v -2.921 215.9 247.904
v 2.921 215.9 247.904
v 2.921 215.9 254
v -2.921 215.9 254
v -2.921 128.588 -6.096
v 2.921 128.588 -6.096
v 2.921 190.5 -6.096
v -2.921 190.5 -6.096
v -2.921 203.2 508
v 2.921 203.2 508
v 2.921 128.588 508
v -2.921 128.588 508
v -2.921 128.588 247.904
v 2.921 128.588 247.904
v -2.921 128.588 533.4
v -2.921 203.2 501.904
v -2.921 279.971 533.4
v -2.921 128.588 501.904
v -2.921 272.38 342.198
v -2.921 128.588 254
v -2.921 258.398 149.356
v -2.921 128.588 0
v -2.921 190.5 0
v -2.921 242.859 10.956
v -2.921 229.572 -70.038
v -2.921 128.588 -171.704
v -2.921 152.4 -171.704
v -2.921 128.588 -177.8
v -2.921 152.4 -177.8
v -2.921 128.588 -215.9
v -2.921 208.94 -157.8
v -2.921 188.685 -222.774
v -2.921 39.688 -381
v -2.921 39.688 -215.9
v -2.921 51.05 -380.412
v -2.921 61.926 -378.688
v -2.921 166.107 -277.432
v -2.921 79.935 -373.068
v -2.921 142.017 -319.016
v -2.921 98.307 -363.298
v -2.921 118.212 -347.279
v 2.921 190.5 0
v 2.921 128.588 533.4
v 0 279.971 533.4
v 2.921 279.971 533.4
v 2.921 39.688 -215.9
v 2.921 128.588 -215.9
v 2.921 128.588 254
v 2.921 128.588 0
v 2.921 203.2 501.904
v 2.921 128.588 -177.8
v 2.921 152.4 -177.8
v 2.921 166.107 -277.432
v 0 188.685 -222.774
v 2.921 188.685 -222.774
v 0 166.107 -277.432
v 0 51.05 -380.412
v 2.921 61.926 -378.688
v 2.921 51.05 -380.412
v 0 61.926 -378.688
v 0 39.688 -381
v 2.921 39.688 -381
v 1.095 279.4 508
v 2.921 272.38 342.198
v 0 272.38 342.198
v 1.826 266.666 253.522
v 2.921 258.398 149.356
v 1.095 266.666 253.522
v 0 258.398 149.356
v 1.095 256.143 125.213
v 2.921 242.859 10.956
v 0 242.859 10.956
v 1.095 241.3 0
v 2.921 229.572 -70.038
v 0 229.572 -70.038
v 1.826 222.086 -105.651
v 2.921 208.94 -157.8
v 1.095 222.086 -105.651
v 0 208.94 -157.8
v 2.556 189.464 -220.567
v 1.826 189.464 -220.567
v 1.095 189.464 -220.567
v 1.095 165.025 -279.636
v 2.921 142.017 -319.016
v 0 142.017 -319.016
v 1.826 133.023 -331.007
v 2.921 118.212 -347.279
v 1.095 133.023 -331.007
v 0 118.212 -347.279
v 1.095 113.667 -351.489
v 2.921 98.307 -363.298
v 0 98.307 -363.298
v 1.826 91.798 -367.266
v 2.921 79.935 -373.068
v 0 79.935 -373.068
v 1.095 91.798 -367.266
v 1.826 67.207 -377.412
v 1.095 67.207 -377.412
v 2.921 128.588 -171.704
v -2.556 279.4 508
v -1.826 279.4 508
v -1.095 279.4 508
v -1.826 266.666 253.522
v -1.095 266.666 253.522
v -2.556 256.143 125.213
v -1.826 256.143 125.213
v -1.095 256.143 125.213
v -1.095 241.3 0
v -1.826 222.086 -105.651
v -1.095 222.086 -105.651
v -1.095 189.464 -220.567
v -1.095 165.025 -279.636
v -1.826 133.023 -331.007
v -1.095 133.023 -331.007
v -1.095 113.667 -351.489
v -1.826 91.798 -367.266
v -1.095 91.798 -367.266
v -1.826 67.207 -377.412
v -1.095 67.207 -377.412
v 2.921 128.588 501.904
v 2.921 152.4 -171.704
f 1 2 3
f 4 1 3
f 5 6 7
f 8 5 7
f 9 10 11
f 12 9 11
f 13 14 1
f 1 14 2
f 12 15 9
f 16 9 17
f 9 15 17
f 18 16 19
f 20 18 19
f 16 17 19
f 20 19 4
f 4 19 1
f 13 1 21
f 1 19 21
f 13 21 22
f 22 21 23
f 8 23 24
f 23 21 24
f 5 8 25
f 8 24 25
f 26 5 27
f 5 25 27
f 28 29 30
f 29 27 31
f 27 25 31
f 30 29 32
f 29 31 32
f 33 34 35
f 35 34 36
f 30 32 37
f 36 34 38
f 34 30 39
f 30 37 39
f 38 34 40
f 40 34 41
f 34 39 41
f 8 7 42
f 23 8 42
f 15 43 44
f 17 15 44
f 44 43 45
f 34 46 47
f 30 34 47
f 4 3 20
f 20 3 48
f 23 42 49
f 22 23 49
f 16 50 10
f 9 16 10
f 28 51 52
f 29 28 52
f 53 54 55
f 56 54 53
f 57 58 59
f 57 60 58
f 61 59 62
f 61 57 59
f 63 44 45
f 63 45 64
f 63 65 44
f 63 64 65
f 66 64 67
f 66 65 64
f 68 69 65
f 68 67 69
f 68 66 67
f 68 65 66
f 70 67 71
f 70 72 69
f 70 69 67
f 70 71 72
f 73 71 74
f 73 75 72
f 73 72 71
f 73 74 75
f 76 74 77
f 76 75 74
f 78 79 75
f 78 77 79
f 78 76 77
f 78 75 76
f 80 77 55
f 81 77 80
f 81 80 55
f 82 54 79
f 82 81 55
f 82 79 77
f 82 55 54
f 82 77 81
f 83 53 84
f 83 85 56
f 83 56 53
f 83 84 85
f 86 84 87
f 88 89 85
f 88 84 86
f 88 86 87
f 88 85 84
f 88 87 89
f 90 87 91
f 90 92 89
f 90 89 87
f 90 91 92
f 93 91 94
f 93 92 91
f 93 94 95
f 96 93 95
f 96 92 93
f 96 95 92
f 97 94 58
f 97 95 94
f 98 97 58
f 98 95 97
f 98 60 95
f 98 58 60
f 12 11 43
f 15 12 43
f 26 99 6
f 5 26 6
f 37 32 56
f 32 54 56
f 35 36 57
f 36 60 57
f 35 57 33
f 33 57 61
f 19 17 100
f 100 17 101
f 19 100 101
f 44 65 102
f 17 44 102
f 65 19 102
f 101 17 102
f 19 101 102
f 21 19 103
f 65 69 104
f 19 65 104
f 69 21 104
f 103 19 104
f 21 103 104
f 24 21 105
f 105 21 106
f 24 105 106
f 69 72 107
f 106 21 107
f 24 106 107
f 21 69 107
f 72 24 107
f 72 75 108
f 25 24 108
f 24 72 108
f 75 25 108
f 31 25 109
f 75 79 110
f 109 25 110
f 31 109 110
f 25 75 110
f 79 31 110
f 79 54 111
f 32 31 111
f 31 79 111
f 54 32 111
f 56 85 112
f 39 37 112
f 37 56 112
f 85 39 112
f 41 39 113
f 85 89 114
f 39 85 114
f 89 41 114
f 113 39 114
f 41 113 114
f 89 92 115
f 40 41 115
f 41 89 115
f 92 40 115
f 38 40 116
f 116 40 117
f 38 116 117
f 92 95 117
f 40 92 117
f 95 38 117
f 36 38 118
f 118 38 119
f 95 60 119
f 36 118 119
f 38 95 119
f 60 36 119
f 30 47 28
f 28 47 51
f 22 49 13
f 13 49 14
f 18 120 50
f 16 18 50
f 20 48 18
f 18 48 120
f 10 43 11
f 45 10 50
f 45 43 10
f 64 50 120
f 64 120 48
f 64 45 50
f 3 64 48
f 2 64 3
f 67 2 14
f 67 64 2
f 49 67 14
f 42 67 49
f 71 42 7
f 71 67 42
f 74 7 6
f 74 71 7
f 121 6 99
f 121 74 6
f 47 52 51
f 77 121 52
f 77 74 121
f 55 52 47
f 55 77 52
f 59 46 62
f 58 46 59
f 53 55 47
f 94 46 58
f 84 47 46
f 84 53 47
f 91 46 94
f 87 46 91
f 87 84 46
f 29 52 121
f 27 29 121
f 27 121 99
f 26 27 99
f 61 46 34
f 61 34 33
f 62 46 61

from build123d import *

# Parameters (mm, degrees)
BOSS_EXTRUDE1_DEPTH = 2.921
CUT_EXTRUDE1_DEPTH  = 1488.311355111


with BuildPart() as part:
    # Sketch2 → Boss-Extrude1 (new, symmetric)
    with BuildSketch(Plane(origin=(0, 0, 0), x_dir=(0, 0, -1), z_dir=(1, 0, 0))):
        with BuildLine():
            Line((-1460.5, 39.6875), (381, 39.6875))
            add(Edge.make_bspline(
                [(-1460.5, 39.6875), (-1460.5, 123.854582151), (-1400.448958782, 238.643618873), (-1168.264534851, 278.653196971), (-889.863220578, 278.192638574), (-549.517003244, 284.069445788), (-254.872972463, 268.16247247), (-19.653982034, 247.753440535), (192.838300002, 207.087014824), (381, 130.986638489), (381, 39.6875)],
                knots=[0, 0, 0, 0, 0.114447643, 0.153235008, 0.341616396, 0.529762749, 0.655350341, 0.781406837, 0.871201698, 1, 1, 1, 1], degree=3))
        make_face()
    extrude(amount=BOSS_EXTRUDE1_DEPTH, both=True)

    # Sketch3 → Cut-Extrude1 (cut, through all)
    with BuildSketch(Plane(origin=(2.921, 0, 0), x_dir=(0, 0, -1), z_dir=(1, 0, 0))):
        Polygon((215.9, 39.6875), (215.9, 128.5875), (177.8, 128.5875), (177.8, 152.4), (171.704, 152.4), (171.704, 128.5875), (6.096, 128.5875), (6.096, 190.5), (0, 190.5), (0, 128.5875), (-247.904, 128.5875), (-247.904, 215.9), (-254, 215.9), (-254, 128.5875), (-501.904, 128.5875), (-501.904, 203.2), (-508, 203.2), (-508, 128.5875), (-533.4, 128.5875), (-533.4, 394.349763682), (-1608.850266825, 394.349763682), (-1608.850266825, 39.6875), align=None)
    extrude(amount=-CUT_EXTRUDE1_DEPTH, mode=Mode.SUBTRACT)


solid = part.part
